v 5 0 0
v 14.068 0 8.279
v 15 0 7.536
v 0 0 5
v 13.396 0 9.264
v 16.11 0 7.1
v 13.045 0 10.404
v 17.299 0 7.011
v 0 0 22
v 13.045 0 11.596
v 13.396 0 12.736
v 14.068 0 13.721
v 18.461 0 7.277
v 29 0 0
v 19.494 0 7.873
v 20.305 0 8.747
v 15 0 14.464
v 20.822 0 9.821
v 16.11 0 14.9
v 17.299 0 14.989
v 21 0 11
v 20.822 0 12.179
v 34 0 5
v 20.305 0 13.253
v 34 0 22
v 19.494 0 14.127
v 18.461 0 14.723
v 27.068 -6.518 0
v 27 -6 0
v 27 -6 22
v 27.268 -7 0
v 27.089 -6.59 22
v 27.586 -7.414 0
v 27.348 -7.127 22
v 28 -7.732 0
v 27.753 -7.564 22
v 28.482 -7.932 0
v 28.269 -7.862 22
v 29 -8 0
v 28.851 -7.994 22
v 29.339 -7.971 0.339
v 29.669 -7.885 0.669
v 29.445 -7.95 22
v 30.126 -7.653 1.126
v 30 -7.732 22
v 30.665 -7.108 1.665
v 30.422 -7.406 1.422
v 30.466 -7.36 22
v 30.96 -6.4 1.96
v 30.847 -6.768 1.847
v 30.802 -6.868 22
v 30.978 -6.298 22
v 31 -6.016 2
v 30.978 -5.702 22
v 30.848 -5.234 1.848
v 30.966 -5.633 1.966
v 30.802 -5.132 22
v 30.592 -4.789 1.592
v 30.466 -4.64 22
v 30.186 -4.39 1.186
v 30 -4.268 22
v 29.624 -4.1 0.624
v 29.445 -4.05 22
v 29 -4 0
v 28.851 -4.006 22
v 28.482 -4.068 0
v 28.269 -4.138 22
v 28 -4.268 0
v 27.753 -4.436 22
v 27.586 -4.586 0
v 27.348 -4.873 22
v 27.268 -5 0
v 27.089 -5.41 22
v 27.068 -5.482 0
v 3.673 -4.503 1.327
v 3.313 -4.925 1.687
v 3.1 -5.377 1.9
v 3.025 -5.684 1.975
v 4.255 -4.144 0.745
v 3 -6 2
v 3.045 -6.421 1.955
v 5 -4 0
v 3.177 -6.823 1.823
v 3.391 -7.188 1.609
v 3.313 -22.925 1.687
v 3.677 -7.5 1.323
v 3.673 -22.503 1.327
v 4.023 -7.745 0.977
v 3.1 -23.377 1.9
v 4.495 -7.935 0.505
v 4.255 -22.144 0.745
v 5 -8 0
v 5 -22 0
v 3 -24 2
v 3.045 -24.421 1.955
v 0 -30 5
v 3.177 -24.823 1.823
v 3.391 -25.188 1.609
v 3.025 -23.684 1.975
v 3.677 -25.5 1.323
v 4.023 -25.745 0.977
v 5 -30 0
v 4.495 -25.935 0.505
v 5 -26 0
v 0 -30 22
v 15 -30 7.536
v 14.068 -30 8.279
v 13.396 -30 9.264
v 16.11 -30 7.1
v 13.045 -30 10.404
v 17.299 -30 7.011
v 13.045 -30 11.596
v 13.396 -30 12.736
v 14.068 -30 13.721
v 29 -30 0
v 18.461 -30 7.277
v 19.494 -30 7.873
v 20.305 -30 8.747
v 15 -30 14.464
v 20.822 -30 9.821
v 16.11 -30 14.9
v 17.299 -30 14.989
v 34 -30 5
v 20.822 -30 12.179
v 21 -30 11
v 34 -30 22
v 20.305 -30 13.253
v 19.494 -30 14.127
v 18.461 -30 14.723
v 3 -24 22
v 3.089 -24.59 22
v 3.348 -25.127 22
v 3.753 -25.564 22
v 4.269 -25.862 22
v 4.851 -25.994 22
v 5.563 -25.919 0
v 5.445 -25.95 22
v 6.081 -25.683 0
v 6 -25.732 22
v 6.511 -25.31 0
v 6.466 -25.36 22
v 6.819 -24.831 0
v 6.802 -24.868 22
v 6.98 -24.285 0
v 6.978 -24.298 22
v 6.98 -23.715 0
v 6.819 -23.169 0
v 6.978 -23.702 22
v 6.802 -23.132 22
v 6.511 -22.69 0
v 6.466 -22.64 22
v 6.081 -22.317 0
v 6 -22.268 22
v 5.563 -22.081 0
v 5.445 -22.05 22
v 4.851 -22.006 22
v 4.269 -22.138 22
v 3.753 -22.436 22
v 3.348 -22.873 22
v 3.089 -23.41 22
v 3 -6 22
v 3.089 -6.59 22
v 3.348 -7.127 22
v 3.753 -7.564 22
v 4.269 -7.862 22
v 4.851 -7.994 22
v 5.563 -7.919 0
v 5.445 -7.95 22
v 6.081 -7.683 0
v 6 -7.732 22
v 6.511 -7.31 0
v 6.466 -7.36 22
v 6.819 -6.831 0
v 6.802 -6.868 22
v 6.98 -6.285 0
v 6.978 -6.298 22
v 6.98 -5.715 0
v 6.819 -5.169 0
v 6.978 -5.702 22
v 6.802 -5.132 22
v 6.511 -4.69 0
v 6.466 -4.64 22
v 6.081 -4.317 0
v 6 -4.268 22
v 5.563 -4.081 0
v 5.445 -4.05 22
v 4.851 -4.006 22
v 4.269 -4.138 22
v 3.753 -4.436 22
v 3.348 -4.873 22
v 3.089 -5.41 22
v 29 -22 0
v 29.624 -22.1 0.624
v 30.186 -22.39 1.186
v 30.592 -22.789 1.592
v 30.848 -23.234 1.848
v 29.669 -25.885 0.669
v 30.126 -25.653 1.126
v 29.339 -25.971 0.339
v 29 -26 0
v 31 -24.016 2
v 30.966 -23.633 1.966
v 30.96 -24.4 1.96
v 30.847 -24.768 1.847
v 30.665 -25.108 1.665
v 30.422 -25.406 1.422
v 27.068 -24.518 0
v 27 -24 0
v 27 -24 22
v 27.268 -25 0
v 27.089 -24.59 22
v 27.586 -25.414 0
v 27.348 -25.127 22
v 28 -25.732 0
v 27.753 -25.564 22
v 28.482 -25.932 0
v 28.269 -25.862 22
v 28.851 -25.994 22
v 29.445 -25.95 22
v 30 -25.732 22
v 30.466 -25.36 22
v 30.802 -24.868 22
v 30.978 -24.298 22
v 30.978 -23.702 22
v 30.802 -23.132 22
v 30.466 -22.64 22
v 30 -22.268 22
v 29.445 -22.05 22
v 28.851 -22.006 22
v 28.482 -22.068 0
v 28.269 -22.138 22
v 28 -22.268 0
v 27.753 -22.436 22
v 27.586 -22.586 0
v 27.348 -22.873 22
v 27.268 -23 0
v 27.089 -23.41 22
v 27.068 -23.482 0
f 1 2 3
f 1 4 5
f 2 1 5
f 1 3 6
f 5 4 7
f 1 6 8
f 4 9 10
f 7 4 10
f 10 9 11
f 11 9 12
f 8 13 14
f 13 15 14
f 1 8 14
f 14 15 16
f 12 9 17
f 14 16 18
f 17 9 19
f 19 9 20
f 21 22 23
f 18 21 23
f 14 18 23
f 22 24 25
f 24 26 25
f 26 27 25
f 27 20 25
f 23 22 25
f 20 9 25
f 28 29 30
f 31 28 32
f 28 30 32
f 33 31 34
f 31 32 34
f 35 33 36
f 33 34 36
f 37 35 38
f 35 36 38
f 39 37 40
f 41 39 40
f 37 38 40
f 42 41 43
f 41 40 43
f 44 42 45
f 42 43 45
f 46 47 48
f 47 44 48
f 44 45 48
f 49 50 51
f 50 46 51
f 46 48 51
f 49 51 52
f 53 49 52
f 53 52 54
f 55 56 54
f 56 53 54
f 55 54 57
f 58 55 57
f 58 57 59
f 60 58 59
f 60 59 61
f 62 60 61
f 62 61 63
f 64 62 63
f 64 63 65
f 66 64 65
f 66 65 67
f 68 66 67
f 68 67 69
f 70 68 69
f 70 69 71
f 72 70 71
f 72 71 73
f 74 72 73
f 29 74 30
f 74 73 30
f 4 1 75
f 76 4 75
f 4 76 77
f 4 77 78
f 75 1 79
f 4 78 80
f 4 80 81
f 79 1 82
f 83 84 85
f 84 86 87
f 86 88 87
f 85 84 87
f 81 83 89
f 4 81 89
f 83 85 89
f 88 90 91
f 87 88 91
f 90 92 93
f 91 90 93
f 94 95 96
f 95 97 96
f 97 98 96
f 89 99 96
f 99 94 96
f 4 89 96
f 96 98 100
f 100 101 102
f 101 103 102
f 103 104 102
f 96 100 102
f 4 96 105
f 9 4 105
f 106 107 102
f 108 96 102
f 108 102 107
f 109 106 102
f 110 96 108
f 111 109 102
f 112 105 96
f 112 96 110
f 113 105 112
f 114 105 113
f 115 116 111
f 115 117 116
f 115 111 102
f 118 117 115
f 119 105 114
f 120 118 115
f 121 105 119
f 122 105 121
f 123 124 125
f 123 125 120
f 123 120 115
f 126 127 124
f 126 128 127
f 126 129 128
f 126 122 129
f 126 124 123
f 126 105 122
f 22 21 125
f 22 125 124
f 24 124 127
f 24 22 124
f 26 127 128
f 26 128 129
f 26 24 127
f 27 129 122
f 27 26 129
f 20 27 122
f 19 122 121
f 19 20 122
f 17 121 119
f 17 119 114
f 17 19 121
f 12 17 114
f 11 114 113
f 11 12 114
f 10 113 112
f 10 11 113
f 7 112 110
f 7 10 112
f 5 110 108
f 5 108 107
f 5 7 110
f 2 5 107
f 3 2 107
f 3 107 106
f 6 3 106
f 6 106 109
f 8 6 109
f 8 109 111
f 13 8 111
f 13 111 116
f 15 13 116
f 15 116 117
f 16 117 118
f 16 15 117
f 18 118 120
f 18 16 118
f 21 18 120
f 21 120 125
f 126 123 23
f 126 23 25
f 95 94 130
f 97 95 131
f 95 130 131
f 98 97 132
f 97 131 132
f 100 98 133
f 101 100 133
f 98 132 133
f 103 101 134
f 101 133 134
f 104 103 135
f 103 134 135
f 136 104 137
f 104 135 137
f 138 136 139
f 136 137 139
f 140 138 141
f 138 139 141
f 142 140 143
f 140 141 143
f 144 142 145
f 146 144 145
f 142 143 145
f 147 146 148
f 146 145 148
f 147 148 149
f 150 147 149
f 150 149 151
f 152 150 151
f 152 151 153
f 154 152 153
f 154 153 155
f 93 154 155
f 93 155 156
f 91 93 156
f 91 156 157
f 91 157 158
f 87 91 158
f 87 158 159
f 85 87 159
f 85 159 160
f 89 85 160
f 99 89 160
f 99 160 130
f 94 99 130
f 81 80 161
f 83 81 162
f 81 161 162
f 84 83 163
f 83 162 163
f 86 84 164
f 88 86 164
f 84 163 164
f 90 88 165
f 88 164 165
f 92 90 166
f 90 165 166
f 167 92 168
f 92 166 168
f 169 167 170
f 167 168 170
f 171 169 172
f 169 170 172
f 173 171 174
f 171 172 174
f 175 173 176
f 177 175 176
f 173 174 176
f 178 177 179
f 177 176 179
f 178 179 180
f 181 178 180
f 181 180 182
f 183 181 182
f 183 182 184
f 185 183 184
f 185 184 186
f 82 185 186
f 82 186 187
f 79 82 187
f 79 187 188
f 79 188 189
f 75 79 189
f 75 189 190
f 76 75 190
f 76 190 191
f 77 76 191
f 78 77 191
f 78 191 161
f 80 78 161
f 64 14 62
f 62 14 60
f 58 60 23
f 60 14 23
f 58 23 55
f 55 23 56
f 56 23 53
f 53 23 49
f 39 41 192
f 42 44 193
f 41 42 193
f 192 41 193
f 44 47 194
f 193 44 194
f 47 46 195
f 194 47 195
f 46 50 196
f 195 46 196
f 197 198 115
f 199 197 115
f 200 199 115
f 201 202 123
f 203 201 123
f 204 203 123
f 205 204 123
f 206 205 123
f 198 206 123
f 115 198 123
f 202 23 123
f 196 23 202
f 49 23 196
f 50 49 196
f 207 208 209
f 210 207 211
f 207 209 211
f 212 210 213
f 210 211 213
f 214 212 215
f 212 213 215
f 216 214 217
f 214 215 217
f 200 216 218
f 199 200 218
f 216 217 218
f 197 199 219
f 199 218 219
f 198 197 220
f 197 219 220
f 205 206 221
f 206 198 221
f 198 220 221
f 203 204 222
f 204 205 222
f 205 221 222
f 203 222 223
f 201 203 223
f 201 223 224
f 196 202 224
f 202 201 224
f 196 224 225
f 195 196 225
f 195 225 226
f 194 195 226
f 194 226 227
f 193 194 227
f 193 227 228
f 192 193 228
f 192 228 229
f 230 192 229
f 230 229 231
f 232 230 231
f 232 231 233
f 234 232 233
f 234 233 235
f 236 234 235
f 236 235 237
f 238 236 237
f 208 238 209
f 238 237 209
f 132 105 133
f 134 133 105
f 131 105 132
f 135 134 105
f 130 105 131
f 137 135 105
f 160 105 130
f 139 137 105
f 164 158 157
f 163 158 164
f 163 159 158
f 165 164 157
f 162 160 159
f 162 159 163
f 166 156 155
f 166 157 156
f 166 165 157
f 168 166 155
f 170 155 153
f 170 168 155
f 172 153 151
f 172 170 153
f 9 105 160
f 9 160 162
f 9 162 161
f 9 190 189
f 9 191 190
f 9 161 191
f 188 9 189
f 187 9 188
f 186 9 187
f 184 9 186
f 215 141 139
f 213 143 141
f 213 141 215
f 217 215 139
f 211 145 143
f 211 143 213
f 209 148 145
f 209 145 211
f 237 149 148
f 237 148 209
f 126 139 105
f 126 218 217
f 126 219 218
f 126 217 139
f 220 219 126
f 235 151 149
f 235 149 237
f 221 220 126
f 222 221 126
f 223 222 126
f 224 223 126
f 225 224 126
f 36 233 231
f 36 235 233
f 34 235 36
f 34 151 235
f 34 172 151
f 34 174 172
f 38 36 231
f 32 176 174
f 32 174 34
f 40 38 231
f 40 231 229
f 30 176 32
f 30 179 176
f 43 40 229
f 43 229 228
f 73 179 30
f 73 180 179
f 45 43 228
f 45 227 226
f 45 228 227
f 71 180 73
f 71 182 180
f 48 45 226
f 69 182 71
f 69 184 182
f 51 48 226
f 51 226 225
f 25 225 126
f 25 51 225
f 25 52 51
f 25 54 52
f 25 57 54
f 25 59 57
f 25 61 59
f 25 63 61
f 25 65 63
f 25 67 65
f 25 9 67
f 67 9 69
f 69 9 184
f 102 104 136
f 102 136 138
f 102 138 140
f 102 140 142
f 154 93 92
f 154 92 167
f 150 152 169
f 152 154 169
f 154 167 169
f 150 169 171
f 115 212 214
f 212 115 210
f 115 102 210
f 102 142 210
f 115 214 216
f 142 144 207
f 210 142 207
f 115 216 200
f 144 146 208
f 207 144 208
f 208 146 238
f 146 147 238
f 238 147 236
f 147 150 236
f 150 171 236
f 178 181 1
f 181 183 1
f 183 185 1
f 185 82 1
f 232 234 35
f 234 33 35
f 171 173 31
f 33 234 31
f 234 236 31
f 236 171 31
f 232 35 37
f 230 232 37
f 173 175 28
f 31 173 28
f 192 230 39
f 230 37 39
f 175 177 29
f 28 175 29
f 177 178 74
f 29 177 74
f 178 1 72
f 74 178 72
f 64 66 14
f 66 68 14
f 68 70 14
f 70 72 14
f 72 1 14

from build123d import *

# Parameters (mm, degrees)
SKETCH_W     = 34
SKETCH_H     = 22
SKETCH_R     = 4
PAD_DEPTH    = 30
CHAMFER_SIZE = 5
SKETCH001_R  = 2
POCKET_DEPTH = 22


with BuildPart() as part:
    # Sketch → Pad (new body)
    with BuildSketch(Plane.XZ):
        with Locations((17, 11)):
            Rectangle(SKETCH_W, SKETCH_H)
        with Locations((17, 11)):
            Circle(SKETCH_R, mode=Mode.SUBTRACT)
    extrude(amount=PAD_DEPTH)

    # Chamfer
    chamfer_edges = [part.edges().sort_by_distance(p)[0] for p in [
        (0, -15, 0),
        (34, -15, 0),
    ]]
    chamfer(chamfer_edges, length=CHAMFER_SIZE)

    # Sketch001 (on Face8 of Chamfer) → Pocket (cut)
    with BuildSketch(Plane(origin=(0, 0, 22), x_dir=(-1, 0, 0), z_dir=(0, 0, 1))):
        with Locations((-29, 24)):
            Circle(SKETCH001_R)
        with Locations((-5, 24)):
            Circle(SKETCH001_R)
        with Locations((-29, 6)):
            Circle(SKETCH001_R)
        with Locations((-5, 6)):
            Circle(SKETCH001_R)
    extrude(amount=-POCKET_DEPTH, mode=Mode.SUBTRACT)


solid = part.part
